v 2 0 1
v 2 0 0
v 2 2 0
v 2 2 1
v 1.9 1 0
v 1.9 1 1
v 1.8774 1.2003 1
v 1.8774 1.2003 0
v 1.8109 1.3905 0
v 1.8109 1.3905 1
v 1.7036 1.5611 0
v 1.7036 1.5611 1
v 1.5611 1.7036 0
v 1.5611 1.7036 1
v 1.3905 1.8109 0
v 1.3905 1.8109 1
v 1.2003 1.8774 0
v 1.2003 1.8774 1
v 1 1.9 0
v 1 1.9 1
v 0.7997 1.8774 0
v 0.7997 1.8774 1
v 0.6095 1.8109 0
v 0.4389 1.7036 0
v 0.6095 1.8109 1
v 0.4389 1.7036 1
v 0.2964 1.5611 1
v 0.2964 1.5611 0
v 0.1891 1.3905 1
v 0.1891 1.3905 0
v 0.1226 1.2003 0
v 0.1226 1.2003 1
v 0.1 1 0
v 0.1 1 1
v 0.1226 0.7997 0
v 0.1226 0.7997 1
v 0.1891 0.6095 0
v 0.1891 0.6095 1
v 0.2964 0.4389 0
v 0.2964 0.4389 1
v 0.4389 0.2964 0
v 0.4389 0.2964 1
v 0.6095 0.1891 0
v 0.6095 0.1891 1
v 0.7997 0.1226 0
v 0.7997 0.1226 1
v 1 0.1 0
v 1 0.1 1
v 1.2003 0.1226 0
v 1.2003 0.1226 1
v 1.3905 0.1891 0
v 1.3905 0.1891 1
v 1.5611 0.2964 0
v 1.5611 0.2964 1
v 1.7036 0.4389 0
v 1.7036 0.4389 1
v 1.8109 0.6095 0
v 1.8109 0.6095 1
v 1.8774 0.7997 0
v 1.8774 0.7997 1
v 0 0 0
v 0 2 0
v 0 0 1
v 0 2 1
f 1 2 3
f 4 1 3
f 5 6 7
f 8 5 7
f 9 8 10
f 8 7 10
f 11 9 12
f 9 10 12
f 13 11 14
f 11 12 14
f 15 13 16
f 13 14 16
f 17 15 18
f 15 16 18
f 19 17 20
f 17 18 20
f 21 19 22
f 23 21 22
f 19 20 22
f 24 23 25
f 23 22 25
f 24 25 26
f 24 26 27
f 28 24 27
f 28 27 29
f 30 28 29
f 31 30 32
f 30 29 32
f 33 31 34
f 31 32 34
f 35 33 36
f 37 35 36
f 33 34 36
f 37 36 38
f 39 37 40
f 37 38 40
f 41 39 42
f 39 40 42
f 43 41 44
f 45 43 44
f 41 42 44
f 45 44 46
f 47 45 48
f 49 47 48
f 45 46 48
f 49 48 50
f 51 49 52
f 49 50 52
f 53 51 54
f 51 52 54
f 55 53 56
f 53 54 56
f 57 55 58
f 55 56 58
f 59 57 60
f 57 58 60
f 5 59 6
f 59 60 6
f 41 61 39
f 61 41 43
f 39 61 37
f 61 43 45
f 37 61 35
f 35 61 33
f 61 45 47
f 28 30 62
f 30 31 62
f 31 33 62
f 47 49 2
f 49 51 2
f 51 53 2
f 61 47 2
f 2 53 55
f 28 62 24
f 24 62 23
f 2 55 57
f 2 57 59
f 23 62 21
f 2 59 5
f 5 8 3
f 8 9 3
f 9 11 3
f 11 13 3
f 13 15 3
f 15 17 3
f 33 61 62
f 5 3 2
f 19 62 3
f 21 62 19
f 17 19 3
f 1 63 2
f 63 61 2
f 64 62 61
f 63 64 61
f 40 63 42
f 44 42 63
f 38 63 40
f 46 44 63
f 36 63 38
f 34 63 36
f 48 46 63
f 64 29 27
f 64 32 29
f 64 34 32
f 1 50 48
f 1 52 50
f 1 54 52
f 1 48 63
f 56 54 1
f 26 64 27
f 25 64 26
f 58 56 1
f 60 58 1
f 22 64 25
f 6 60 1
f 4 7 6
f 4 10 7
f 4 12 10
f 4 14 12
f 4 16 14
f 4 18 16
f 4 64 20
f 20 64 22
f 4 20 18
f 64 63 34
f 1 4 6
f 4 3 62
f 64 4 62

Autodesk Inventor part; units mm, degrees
ref_plane "YZ Plane" through (0, 0, 0) normal (1, 0, 0) x (0, 1, 0)
ref_plane "XZ Plane" through (0, 0, 0) normal (0, 1, 0) x (-1, 0, 0)
ref_plane "XY Plane" through (0, 0, 0) normal (0, 0, 1) x (1, 0, 0)
sketch "Sketch1" plane through (0, 0, 0) normal (0, 0, 1) x (1, 0, 0)
  line L0 (0, 0) -> (2, 0)
  line L1 (2, 0) -> (2, 2)
  line L2 (2, 2) -> (0, 2)
  line L3 (0, 2) -> (0, 0)
  dimension "d0" = 2
  dimension "d1" = 2
extrude "Extrusion1" add sketch "Sketch1" along normal blind 1
sketch "Sketch2" plane through (0, 0, 1) normal (0, 0, 1) x (1, 0, 0)
  line L0 (0, 0) -> (1, 0)
  line L1 (0, 0) -> (2, 0) projected
  line L2 (1, 0) -> (2, 0)
  line L3 (2, 0) -> (2, 1)
  line L4 (2, 0) -> (2, 2) projected
  line L5 (2, 1) -> (1, 1)
  circle A0 centre (1, 1) radius 0.9
  dimension "d4" = 1
  dimension "d5" = 1
  dimension "d6" = 1
  dimension "d7" = 1
  dimension "d8" = 1.8
extrude "Extrusion2" cut sketch "Sketch2" against normal through all
thread "Thread1" size "M1.8x0.35" class "6H" standard "ANSI Metric M Profile" full length
properties part number "NUT FOR SERVO"
